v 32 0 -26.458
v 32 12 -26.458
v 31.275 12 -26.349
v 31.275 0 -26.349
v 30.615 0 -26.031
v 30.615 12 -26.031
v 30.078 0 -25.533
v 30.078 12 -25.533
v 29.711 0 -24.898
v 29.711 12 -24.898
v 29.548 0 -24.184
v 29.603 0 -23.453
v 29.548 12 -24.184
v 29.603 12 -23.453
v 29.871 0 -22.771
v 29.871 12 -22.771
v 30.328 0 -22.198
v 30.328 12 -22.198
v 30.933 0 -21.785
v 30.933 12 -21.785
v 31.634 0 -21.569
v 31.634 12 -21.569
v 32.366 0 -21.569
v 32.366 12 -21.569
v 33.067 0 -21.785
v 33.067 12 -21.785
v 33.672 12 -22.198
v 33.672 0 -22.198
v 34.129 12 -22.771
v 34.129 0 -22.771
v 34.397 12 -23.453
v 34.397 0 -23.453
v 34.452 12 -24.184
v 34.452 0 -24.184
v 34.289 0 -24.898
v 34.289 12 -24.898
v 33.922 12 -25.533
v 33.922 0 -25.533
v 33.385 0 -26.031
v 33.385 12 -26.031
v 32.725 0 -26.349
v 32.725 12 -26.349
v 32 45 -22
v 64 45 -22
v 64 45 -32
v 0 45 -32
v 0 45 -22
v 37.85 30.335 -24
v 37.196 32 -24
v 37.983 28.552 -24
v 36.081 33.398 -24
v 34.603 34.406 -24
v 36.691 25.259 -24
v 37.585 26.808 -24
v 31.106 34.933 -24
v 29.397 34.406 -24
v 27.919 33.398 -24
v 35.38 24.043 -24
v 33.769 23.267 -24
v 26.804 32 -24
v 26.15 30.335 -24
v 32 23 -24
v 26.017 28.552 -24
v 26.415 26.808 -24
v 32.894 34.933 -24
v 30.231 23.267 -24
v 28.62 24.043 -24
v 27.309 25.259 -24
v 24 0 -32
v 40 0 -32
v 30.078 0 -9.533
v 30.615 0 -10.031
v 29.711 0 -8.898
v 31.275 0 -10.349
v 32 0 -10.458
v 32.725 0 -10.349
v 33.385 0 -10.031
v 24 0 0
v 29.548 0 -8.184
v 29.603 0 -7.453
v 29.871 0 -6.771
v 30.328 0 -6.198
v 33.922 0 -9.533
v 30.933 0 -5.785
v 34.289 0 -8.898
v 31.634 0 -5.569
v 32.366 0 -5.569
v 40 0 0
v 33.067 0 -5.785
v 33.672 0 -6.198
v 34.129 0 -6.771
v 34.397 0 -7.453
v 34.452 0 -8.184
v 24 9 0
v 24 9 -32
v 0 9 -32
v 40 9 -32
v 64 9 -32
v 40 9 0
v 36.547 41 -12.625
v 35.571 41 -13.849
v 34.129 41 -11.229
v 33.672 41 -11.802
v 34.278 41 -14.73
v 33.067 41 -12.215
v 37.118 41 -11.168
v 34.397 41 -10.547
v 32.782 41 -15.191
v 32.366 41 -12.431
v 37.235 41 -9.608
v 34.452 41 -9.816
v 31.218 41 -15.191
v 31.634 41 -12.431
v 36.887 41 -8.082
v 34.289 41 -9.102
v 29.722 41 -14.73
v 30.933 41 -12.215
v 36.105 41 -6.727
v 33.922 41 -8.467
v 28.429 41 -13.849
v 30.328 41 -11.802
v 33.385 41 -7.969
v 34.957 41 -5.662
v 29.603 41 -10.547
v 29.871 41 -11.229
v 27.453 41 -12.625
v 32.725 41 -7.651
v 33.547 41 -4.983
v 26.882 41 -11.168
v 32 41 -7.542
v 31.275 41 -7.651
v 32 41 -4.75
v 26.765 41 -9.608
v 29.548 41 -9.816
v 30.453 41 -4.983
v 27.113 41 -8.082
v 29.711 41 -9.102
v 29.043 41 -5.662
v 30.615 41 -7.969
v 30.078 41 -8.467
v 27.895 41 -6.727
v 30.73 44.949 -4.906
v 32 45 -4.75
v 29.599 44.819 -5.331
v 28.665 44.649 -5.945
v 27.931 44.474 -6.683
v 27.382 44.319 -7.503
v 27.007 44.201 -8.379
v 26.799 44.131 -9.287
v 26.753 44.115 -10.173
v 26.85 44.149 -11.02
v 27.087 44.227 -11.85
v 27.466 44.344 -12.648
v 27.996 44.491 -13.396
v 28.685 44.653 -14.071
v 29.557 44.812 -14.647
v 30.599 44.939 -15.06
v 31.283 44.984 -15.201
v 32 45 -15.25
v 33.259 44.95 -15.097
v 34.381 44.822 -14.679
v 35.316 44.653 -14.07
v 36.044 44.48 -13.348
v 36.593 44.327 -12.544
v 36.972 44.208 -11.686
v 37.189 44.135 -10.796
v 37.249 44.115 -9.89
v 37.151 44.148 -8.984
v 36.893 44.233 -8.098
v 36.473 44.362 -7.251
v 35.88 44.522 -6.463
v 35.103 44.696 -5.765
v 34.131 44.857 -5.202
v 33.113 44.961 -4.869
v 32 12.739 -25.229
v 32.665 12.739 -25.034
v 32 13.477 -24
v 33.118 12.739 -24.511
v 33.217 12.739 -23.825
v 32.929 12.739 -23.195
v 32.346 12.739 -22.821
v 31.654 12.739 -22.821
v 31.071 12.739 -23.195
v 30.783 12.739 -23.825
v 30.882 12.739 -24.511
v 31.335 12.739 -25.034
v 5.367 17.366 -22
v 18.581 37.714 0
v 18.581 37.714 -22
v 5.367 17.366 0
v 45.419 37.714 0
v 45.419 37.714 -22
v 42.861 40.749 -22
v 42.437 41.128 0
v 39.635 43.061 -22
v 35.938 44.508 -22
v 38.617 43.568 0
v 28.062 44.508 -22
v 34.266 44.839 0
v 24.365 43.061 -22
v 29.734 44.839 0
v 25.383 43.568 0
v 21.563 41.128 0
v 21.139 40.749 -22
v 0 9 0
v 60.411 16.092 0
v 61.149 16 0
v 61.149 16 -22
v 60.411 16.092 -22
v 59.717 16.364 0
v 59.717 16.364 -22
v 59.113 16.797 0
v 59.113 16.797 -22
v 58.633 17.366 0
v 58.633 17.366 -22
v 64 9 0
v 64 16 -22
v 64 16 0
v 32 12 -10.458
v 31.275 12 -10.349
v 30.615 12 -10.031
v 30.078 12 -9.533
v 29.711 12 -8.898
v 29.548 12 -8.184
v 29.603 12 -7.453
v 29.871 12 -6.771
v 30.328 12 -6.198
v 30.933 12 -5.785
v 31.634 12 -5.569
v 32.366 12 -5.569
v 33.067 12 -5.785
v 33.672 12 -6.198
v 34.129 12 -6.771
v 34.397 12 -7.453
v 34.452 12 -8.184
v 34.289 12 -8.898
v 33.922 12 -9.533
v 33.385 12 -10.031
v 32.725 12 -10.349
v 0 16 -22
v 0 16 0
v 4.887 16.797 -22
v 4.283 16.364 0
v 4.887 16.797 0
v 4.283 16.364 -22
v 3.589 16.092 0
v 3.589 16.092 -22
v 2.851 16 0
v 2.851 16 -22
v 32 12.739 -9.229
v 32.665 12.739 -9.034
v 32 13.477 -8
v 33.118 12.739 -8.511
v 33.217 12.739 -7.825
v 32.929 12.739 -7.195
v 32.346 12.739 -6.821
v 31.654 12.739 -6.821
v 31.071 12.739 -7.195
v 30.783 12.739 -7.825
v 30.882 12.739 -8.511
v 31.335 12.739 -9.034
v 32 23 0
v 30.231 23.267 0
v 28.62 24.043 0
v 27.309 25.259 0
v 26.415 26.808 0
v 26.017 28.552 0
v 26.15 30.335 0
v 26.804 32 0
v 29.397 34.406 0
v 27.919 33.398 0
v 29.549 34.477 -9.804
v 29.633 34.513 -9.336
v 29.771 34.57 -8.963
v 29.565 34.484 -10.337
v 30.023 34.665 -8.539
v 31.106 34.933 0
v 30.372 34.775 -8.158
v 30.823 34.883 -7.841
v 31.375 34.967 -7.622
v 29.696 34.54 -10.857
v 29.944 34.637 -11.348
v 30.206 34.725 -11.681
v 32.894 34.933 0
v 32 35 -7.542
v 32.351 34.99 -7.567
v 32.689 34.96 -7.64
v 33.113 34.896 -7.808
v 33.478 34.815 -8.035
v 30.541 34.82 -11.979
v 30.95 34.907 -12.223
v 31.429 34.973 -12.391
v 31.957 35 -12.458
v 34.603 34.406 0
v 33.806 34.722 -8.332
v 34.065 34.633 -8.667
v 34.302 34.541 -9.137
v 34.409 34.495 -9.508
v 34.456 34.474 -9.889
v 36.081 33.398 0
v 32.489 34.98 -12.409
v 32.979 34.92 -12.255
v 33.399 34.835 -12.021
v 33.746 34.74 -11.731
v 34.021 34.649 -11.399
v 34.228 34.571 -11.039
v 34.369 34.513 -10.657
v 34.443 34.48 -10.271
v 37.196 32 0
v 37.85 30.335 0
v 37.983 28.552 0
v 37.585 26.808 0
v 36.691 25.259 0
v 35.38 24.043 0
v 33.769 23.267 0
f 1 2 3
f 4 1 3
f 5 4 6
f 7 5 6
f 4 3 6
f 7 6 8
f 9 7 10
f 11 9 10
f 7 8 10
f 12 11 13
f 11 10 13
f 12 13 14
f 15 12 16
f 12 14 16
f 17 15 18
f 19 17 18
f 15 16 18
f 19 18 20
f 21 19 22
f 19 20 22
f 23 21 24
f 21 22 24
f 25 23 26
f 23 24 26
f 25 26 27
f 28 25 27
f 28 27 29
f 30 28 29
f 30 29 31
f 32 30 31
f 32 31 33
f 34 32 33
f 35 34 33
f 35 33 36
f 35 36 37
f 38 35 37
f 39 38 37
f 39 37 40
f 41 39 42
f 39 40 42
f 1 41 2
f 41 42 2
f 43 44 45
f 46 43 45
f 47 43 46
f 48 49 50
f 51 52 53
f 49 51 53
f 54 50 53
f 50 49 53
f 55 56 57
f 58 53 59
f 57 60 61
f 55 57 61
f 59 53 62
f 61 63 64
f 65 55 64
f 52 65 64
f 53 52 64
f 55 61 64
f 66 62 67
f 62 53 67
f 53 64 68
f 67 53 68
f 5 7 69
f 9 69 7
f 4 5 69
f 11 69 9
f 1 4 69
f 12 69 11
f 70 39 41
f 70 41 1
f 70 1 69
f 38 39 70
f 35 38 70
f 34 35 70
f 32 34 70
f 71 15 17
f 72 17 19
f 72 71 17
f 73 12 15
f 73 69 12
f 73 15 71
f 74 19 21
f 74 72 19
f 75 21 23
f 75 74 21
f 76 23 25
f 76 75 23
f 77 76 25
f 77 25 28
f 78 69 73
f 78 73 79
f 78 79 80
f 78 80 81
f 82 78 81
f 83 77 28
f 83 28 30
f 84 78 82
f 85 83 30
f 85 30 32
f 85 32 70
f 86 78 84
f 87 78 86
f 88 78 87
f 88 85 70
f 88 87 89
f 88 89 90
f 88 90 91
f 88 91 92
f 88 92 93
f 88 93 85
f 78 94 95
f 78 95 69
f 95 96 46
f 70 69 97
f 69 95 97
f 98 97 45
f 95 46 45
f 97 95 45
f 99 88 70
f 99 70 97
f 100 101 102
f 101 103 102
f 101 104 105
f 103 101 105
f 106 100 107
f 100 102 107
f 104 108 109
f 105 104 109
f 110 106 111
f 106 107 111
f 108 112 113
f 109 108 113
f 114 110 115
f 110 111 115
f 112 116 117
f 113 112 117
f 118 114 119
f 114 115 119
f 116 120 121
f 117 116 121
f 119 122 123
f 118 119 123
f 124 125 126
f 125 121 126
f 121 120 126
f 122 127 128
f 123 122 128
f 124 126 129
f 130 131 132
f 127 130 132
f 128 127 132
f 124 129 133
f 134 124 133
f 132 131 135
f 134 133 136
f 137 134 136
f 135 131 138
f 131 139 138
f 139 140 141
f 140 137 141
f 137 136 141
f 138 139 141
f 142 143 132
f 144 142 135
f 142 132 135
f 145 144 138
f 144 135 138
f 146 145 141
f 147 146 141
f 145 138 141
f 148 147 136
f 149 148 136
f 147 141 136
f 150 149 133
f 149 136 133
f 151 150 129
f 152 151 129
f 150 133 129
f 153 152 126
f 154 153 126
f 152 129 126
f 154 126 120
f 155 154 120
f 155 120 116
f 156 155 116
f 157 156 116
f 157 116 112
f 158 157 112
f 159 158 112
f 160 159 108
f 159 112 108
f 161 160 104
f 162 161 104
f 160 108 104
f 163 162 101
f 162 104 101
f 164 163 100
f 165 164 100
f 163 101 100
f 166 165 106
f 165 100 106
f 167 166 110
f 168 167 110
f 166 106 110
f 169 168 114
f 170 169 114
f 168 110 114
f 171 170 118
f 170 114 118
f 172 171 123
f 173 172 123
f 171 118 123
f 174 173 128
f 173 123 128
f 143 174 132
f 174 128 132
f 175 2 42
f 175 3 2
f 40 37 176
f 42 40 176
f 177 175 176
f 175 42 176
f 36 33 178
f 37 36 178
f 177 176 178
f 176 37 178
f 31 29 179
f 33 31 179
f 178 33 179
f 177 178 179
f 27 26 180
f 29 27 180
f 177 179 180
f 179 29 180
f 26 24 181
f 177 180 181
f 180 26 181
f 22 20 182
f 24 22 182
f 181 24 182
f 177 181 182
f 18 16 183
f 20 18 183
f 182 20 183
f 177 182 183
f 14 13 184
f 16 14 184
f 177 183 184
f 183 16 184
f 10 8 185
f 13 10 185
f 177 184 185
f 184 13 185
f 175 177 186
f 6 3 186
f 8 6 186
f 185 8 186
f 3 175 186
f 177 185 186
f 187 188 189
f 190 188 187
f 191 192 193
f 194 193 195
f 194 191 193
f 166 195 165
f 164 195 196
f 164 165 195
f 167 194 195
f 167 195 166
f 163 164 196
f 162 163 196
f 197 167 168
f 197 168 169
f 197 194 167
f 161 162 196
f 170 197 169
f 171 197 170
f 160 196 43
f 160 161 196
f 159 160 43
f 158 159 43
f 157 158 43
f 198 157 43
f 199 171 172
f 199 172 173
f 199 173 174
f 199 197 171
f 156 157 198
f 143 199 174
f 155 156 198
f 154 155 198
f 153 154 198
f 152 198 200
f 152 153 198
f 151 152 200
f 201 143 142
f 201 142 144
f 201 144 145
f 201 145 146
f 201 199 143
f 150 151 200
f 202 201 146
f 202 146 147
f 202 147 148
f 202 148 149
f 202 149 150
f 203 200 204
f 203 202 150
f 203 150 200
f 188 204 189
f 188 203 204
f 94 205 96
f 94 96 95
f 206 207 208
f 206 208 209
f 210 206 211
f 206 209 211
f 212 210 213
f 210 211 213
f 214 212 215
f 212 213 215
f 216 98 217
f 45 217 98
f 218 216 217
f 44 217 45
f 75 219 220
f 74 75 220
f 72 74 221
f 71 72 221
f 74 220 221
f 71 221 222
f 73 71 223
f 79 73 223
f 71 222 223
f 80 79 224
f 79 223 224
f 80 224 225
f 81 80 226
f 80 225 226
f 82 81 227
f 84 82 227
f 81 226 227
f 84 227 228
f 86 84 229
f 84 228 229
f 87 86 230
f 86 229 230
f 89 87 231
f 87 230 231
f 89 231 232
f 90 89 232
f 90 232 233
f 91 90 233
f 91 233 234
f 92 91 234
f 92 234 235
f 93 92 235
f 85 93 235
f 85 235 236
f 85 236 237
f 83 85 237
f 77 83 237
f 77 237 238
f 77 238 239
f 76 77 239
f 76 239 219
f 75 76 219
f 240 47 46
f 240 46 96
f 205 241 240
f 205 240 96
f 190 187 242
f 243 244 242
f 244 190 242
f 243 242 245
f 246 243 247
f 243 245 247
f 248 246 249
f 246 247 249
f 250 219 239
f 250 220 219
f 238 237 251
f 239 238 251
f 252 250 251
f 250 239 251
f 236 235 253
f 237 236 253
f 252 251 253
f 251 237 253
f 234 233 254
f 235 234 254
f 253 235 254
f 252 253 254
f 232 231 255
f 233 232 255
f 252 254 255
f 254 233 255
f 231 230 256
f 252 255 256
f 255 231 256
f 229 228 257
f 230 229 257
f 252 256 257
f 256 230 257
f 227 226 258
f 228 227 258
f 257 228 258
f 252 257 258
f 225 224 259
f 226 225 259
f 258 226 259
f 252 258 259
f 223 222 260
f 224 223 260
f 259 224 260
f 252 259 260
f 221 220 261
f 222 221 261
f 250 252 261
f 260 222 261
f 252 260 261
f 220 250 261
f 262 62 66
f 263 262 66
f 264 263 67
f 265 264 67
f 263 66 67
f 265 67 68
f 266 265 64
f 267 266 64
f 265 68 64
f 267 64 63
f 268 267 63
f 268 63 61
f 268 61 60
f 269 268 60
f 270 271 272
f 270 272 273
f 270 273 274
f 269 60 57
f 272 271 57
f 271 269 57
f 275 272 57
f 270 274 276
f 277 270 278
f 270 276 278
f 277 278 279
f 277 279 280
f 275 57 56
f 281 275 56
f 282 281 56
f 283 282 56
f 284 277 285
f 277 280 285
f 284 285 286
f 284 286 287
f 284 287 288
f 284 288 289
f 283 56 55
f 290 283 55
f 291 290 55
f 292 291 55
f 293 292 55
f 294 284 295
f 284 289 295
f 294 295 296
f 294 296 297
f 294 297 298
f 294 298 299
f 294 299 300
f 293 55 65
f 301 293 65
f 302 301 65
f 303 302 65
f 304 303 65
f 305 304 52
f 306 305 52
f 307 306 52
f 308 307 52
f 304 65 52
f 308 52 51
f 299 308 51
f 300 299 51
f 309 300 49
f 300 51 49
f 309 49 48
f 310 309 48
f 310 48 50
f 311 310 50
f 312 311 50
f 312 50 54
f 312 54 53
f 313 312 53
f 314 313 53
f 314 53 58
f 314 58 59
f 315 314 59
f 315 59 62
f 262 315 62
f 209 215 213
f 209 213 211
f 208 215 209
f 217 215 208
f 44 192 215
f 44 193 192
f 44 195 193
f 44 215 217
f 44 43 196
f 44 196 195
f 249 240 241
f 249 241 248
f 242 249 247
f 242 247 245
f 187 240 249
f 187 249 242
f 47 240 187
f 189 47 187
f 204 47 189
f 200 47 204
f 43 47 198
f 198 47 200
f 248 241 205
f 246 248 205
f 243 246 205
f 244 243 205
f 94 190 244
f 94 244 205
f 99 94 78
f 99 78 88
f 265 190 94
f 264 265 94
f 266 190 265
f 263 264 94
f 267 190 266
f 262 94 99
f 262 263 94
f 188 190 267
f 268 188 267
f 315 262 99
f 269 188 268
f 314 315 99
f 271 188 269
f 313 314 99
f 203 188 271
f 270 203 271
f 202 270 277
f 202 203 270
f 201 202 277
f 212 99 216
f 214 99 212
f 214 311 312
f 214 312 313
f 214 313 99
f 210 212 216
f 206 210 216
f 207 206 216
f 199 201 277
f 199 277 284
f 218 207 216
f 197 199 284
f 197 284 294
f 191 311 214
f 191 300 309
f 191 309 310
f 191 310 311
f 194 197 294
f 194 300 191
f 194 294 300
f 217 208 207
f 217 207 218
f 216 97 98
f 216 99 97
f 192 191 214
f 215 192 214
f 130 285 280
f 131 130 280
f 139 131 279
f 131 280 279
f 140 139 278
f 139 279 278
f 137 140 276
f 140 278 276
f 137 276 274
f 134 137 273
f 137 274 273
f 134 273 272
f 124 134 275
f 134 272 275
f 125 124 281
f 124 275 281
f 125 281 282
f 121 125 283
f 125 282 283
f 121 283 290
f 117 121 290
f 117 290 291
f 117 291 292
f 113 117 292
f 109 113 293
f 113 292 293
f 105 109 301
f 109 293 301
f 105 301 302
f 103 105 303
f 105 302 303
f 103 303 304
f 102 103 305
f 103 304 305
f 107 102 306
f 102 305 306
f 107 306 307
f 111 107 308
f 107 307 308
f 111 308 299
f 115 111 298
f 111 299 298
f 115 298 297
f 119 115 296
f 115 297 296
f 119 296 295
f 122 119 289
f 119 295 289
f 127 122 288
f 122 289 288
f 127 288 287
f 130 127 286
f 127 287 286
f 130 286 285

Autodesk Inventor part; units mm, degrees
ref_plane "YZ Plane" through (0, 0, 0) normal (1, 0, 0) x (0, 1, 0)
ref_plane "XZ Plane" through (0, 0, 0) normal (0, 1, 0) x (-1, 0, 0)
ref_plane "XY Plane" through (0, 0, 0) normal (0, 0, 1) x (1, 0, 0)
sketch "Esboço1" plane through (0, 0, 0) normal (0, 0, 1) x (1, 0, 0)
  line L0 (0, 0) -> (64, 0)
  line L1 (64, 0) -> (64, 45)
  line L2 (64, 45) -> (0, 45)
  line L3 (0, 45) -> (0, 0)
  dimension "d0" = 64
  dimension "d1" = 45
extrude "Extrusão1" add sketch "Esboço1" against normal blind 32
sketch "Esboço2" plane through (0, 0, 0) normal (0, 0, 1) x (1, 0, 0)
  line L0 (0, 0) -> (0, 9)
  line L1 (0, 0) -> (0, 45) projected
  line L2 (0, 9) -> (24, 9)
  line L3 (24, 9) -> (24, 0)
  line L4 (24, 0) -> (40, 0)
  line L5 (64, 0) -> (0, 0) projected
  line L6 (40, 0) -> (40, 9)
  line L7 (40, 9) -> (64, 9)
  line L8 (64, 45) -> (64, 0) projected
  line L9 (0, 9) -> (0, 16)
  line L10 (64, 9) -> (64, 16)
  circle A0 centre (32, 29) radius 16
  line L11 (45.4187, 37.7142) -> (59.5201, 16)
  line L12 (18.5813, 37.7142) -> (4.4799, 16)
  line L13 (0, 16) -> (4.4799, 16)
  line L14 (59.5201, 16) -> (64, 16)
  line L15 (0, 16) -> (0, 45)
  line L16 (64, 45) -> (0, 45)
  line L17 (64, 45) -> (64, 16)
  point P0 (32, 45)
  dimension "d4" = 9
  dimension "d9" = 7
extrude "Extrusão2" cut sketch "Esboço2" against normal blind 22 contours L0 L2 L3 L5 | L1 L16 A0 L12 L13 | L6 L7 L8 L5 | L16 L8 L14 L11 A0
sketch "Esboço3" plane through (0, 0, 0) normal (0, 0, 1) x (1, 0, 0)
  line L0 (0, 0) -> (64, 0) projected
  line L1 (32, 0) -> (32, 29)
  point P0 (24, 0)
  point P1 (40, 0)
  dimension "d16" = 29
hole "Furo1" at (32, 29, 0) direction (0, 0, -1) diameter 12 depth 24
fillet "Arredondamento1" radius 3 2 edges at (4.4799, 16, -11) (59.5201, 16, -11)
sketch "Esboço5" plane through (0, 45, 0) normal (0, 1, 0) x (1, 0, 0)
  line L0 (64, 32) -> (0, 32) projected
  line L1 (0, 0) -> (0, 32) projected
  line L2 (0, 32) -> (0, 10)
  line L3 (0, 10) -> (32, 10)
  dimension "d30" = 22
hole "Furo2" at (32, 45, -10) direction (0, -1, 0) diameter 4.917 depth 11 tip angle 118 counterbore diameter 10.5 counterbore depth 4 thread size "M6x1" class "6H" standard "ISO Metric profile"
sketch "Esboço6" plane through (0, 0, -32) normal (0, -1, 0) x (1, 0, 0)
  line L0 (45.4187, 32) -> (18.5813, 32) projected
  line L1 (32, 24) -> (32, 8)
  line L2 (38, 8) -> (26, 8) projected
  point P0 (0, 32)
  dimension "d40" = 16
hole "Furo3" at (32, 0, -8) at (32, 0, -24) direction (0, 1, 0) diameter 4.917 depth 12 tip angle 118 thread size "M6x1" class "6H" standard "ISO Metric profile"
sketch "Sketch7" plane through (0, 0, -32) normal (0, -1, 0) x (1, 0, 0)
  line L0 (24, 32) -> (24, 10) projected
  line L1 (24, 10) -> (24, 0)
  line L2 (64, 0) -> (0, 0) projected
  line L3 (0, 0) -> (24, 0)
  line L4 (0, 10) -> (0, 0) projected
  line L5 (0, 0) -> (0, 10)
  line L6 (24, 10) -> (0, 10) projected
  line L7 (0, 10) -> (24, 10)
  line L8 (40, 32) -> (40, 10) projected
  line L9 (40, 10) -> (40, 0)
  line L10 (40, 0) -> (64, 0)
  line L11 (64, 10) -> (64, 0) projected
  line L12 (64, 0) -> (64, 10)
  line L13 (64, 10) -> (40, 10) projected
  line L14 (64, 10) -> (40, 10)
  point P0 (0, 32)
extrude "Extrusion3" cut sketch "Sketch7" against normal blind 9
properties part number "mordente_movel" material "Iron, Cast"
